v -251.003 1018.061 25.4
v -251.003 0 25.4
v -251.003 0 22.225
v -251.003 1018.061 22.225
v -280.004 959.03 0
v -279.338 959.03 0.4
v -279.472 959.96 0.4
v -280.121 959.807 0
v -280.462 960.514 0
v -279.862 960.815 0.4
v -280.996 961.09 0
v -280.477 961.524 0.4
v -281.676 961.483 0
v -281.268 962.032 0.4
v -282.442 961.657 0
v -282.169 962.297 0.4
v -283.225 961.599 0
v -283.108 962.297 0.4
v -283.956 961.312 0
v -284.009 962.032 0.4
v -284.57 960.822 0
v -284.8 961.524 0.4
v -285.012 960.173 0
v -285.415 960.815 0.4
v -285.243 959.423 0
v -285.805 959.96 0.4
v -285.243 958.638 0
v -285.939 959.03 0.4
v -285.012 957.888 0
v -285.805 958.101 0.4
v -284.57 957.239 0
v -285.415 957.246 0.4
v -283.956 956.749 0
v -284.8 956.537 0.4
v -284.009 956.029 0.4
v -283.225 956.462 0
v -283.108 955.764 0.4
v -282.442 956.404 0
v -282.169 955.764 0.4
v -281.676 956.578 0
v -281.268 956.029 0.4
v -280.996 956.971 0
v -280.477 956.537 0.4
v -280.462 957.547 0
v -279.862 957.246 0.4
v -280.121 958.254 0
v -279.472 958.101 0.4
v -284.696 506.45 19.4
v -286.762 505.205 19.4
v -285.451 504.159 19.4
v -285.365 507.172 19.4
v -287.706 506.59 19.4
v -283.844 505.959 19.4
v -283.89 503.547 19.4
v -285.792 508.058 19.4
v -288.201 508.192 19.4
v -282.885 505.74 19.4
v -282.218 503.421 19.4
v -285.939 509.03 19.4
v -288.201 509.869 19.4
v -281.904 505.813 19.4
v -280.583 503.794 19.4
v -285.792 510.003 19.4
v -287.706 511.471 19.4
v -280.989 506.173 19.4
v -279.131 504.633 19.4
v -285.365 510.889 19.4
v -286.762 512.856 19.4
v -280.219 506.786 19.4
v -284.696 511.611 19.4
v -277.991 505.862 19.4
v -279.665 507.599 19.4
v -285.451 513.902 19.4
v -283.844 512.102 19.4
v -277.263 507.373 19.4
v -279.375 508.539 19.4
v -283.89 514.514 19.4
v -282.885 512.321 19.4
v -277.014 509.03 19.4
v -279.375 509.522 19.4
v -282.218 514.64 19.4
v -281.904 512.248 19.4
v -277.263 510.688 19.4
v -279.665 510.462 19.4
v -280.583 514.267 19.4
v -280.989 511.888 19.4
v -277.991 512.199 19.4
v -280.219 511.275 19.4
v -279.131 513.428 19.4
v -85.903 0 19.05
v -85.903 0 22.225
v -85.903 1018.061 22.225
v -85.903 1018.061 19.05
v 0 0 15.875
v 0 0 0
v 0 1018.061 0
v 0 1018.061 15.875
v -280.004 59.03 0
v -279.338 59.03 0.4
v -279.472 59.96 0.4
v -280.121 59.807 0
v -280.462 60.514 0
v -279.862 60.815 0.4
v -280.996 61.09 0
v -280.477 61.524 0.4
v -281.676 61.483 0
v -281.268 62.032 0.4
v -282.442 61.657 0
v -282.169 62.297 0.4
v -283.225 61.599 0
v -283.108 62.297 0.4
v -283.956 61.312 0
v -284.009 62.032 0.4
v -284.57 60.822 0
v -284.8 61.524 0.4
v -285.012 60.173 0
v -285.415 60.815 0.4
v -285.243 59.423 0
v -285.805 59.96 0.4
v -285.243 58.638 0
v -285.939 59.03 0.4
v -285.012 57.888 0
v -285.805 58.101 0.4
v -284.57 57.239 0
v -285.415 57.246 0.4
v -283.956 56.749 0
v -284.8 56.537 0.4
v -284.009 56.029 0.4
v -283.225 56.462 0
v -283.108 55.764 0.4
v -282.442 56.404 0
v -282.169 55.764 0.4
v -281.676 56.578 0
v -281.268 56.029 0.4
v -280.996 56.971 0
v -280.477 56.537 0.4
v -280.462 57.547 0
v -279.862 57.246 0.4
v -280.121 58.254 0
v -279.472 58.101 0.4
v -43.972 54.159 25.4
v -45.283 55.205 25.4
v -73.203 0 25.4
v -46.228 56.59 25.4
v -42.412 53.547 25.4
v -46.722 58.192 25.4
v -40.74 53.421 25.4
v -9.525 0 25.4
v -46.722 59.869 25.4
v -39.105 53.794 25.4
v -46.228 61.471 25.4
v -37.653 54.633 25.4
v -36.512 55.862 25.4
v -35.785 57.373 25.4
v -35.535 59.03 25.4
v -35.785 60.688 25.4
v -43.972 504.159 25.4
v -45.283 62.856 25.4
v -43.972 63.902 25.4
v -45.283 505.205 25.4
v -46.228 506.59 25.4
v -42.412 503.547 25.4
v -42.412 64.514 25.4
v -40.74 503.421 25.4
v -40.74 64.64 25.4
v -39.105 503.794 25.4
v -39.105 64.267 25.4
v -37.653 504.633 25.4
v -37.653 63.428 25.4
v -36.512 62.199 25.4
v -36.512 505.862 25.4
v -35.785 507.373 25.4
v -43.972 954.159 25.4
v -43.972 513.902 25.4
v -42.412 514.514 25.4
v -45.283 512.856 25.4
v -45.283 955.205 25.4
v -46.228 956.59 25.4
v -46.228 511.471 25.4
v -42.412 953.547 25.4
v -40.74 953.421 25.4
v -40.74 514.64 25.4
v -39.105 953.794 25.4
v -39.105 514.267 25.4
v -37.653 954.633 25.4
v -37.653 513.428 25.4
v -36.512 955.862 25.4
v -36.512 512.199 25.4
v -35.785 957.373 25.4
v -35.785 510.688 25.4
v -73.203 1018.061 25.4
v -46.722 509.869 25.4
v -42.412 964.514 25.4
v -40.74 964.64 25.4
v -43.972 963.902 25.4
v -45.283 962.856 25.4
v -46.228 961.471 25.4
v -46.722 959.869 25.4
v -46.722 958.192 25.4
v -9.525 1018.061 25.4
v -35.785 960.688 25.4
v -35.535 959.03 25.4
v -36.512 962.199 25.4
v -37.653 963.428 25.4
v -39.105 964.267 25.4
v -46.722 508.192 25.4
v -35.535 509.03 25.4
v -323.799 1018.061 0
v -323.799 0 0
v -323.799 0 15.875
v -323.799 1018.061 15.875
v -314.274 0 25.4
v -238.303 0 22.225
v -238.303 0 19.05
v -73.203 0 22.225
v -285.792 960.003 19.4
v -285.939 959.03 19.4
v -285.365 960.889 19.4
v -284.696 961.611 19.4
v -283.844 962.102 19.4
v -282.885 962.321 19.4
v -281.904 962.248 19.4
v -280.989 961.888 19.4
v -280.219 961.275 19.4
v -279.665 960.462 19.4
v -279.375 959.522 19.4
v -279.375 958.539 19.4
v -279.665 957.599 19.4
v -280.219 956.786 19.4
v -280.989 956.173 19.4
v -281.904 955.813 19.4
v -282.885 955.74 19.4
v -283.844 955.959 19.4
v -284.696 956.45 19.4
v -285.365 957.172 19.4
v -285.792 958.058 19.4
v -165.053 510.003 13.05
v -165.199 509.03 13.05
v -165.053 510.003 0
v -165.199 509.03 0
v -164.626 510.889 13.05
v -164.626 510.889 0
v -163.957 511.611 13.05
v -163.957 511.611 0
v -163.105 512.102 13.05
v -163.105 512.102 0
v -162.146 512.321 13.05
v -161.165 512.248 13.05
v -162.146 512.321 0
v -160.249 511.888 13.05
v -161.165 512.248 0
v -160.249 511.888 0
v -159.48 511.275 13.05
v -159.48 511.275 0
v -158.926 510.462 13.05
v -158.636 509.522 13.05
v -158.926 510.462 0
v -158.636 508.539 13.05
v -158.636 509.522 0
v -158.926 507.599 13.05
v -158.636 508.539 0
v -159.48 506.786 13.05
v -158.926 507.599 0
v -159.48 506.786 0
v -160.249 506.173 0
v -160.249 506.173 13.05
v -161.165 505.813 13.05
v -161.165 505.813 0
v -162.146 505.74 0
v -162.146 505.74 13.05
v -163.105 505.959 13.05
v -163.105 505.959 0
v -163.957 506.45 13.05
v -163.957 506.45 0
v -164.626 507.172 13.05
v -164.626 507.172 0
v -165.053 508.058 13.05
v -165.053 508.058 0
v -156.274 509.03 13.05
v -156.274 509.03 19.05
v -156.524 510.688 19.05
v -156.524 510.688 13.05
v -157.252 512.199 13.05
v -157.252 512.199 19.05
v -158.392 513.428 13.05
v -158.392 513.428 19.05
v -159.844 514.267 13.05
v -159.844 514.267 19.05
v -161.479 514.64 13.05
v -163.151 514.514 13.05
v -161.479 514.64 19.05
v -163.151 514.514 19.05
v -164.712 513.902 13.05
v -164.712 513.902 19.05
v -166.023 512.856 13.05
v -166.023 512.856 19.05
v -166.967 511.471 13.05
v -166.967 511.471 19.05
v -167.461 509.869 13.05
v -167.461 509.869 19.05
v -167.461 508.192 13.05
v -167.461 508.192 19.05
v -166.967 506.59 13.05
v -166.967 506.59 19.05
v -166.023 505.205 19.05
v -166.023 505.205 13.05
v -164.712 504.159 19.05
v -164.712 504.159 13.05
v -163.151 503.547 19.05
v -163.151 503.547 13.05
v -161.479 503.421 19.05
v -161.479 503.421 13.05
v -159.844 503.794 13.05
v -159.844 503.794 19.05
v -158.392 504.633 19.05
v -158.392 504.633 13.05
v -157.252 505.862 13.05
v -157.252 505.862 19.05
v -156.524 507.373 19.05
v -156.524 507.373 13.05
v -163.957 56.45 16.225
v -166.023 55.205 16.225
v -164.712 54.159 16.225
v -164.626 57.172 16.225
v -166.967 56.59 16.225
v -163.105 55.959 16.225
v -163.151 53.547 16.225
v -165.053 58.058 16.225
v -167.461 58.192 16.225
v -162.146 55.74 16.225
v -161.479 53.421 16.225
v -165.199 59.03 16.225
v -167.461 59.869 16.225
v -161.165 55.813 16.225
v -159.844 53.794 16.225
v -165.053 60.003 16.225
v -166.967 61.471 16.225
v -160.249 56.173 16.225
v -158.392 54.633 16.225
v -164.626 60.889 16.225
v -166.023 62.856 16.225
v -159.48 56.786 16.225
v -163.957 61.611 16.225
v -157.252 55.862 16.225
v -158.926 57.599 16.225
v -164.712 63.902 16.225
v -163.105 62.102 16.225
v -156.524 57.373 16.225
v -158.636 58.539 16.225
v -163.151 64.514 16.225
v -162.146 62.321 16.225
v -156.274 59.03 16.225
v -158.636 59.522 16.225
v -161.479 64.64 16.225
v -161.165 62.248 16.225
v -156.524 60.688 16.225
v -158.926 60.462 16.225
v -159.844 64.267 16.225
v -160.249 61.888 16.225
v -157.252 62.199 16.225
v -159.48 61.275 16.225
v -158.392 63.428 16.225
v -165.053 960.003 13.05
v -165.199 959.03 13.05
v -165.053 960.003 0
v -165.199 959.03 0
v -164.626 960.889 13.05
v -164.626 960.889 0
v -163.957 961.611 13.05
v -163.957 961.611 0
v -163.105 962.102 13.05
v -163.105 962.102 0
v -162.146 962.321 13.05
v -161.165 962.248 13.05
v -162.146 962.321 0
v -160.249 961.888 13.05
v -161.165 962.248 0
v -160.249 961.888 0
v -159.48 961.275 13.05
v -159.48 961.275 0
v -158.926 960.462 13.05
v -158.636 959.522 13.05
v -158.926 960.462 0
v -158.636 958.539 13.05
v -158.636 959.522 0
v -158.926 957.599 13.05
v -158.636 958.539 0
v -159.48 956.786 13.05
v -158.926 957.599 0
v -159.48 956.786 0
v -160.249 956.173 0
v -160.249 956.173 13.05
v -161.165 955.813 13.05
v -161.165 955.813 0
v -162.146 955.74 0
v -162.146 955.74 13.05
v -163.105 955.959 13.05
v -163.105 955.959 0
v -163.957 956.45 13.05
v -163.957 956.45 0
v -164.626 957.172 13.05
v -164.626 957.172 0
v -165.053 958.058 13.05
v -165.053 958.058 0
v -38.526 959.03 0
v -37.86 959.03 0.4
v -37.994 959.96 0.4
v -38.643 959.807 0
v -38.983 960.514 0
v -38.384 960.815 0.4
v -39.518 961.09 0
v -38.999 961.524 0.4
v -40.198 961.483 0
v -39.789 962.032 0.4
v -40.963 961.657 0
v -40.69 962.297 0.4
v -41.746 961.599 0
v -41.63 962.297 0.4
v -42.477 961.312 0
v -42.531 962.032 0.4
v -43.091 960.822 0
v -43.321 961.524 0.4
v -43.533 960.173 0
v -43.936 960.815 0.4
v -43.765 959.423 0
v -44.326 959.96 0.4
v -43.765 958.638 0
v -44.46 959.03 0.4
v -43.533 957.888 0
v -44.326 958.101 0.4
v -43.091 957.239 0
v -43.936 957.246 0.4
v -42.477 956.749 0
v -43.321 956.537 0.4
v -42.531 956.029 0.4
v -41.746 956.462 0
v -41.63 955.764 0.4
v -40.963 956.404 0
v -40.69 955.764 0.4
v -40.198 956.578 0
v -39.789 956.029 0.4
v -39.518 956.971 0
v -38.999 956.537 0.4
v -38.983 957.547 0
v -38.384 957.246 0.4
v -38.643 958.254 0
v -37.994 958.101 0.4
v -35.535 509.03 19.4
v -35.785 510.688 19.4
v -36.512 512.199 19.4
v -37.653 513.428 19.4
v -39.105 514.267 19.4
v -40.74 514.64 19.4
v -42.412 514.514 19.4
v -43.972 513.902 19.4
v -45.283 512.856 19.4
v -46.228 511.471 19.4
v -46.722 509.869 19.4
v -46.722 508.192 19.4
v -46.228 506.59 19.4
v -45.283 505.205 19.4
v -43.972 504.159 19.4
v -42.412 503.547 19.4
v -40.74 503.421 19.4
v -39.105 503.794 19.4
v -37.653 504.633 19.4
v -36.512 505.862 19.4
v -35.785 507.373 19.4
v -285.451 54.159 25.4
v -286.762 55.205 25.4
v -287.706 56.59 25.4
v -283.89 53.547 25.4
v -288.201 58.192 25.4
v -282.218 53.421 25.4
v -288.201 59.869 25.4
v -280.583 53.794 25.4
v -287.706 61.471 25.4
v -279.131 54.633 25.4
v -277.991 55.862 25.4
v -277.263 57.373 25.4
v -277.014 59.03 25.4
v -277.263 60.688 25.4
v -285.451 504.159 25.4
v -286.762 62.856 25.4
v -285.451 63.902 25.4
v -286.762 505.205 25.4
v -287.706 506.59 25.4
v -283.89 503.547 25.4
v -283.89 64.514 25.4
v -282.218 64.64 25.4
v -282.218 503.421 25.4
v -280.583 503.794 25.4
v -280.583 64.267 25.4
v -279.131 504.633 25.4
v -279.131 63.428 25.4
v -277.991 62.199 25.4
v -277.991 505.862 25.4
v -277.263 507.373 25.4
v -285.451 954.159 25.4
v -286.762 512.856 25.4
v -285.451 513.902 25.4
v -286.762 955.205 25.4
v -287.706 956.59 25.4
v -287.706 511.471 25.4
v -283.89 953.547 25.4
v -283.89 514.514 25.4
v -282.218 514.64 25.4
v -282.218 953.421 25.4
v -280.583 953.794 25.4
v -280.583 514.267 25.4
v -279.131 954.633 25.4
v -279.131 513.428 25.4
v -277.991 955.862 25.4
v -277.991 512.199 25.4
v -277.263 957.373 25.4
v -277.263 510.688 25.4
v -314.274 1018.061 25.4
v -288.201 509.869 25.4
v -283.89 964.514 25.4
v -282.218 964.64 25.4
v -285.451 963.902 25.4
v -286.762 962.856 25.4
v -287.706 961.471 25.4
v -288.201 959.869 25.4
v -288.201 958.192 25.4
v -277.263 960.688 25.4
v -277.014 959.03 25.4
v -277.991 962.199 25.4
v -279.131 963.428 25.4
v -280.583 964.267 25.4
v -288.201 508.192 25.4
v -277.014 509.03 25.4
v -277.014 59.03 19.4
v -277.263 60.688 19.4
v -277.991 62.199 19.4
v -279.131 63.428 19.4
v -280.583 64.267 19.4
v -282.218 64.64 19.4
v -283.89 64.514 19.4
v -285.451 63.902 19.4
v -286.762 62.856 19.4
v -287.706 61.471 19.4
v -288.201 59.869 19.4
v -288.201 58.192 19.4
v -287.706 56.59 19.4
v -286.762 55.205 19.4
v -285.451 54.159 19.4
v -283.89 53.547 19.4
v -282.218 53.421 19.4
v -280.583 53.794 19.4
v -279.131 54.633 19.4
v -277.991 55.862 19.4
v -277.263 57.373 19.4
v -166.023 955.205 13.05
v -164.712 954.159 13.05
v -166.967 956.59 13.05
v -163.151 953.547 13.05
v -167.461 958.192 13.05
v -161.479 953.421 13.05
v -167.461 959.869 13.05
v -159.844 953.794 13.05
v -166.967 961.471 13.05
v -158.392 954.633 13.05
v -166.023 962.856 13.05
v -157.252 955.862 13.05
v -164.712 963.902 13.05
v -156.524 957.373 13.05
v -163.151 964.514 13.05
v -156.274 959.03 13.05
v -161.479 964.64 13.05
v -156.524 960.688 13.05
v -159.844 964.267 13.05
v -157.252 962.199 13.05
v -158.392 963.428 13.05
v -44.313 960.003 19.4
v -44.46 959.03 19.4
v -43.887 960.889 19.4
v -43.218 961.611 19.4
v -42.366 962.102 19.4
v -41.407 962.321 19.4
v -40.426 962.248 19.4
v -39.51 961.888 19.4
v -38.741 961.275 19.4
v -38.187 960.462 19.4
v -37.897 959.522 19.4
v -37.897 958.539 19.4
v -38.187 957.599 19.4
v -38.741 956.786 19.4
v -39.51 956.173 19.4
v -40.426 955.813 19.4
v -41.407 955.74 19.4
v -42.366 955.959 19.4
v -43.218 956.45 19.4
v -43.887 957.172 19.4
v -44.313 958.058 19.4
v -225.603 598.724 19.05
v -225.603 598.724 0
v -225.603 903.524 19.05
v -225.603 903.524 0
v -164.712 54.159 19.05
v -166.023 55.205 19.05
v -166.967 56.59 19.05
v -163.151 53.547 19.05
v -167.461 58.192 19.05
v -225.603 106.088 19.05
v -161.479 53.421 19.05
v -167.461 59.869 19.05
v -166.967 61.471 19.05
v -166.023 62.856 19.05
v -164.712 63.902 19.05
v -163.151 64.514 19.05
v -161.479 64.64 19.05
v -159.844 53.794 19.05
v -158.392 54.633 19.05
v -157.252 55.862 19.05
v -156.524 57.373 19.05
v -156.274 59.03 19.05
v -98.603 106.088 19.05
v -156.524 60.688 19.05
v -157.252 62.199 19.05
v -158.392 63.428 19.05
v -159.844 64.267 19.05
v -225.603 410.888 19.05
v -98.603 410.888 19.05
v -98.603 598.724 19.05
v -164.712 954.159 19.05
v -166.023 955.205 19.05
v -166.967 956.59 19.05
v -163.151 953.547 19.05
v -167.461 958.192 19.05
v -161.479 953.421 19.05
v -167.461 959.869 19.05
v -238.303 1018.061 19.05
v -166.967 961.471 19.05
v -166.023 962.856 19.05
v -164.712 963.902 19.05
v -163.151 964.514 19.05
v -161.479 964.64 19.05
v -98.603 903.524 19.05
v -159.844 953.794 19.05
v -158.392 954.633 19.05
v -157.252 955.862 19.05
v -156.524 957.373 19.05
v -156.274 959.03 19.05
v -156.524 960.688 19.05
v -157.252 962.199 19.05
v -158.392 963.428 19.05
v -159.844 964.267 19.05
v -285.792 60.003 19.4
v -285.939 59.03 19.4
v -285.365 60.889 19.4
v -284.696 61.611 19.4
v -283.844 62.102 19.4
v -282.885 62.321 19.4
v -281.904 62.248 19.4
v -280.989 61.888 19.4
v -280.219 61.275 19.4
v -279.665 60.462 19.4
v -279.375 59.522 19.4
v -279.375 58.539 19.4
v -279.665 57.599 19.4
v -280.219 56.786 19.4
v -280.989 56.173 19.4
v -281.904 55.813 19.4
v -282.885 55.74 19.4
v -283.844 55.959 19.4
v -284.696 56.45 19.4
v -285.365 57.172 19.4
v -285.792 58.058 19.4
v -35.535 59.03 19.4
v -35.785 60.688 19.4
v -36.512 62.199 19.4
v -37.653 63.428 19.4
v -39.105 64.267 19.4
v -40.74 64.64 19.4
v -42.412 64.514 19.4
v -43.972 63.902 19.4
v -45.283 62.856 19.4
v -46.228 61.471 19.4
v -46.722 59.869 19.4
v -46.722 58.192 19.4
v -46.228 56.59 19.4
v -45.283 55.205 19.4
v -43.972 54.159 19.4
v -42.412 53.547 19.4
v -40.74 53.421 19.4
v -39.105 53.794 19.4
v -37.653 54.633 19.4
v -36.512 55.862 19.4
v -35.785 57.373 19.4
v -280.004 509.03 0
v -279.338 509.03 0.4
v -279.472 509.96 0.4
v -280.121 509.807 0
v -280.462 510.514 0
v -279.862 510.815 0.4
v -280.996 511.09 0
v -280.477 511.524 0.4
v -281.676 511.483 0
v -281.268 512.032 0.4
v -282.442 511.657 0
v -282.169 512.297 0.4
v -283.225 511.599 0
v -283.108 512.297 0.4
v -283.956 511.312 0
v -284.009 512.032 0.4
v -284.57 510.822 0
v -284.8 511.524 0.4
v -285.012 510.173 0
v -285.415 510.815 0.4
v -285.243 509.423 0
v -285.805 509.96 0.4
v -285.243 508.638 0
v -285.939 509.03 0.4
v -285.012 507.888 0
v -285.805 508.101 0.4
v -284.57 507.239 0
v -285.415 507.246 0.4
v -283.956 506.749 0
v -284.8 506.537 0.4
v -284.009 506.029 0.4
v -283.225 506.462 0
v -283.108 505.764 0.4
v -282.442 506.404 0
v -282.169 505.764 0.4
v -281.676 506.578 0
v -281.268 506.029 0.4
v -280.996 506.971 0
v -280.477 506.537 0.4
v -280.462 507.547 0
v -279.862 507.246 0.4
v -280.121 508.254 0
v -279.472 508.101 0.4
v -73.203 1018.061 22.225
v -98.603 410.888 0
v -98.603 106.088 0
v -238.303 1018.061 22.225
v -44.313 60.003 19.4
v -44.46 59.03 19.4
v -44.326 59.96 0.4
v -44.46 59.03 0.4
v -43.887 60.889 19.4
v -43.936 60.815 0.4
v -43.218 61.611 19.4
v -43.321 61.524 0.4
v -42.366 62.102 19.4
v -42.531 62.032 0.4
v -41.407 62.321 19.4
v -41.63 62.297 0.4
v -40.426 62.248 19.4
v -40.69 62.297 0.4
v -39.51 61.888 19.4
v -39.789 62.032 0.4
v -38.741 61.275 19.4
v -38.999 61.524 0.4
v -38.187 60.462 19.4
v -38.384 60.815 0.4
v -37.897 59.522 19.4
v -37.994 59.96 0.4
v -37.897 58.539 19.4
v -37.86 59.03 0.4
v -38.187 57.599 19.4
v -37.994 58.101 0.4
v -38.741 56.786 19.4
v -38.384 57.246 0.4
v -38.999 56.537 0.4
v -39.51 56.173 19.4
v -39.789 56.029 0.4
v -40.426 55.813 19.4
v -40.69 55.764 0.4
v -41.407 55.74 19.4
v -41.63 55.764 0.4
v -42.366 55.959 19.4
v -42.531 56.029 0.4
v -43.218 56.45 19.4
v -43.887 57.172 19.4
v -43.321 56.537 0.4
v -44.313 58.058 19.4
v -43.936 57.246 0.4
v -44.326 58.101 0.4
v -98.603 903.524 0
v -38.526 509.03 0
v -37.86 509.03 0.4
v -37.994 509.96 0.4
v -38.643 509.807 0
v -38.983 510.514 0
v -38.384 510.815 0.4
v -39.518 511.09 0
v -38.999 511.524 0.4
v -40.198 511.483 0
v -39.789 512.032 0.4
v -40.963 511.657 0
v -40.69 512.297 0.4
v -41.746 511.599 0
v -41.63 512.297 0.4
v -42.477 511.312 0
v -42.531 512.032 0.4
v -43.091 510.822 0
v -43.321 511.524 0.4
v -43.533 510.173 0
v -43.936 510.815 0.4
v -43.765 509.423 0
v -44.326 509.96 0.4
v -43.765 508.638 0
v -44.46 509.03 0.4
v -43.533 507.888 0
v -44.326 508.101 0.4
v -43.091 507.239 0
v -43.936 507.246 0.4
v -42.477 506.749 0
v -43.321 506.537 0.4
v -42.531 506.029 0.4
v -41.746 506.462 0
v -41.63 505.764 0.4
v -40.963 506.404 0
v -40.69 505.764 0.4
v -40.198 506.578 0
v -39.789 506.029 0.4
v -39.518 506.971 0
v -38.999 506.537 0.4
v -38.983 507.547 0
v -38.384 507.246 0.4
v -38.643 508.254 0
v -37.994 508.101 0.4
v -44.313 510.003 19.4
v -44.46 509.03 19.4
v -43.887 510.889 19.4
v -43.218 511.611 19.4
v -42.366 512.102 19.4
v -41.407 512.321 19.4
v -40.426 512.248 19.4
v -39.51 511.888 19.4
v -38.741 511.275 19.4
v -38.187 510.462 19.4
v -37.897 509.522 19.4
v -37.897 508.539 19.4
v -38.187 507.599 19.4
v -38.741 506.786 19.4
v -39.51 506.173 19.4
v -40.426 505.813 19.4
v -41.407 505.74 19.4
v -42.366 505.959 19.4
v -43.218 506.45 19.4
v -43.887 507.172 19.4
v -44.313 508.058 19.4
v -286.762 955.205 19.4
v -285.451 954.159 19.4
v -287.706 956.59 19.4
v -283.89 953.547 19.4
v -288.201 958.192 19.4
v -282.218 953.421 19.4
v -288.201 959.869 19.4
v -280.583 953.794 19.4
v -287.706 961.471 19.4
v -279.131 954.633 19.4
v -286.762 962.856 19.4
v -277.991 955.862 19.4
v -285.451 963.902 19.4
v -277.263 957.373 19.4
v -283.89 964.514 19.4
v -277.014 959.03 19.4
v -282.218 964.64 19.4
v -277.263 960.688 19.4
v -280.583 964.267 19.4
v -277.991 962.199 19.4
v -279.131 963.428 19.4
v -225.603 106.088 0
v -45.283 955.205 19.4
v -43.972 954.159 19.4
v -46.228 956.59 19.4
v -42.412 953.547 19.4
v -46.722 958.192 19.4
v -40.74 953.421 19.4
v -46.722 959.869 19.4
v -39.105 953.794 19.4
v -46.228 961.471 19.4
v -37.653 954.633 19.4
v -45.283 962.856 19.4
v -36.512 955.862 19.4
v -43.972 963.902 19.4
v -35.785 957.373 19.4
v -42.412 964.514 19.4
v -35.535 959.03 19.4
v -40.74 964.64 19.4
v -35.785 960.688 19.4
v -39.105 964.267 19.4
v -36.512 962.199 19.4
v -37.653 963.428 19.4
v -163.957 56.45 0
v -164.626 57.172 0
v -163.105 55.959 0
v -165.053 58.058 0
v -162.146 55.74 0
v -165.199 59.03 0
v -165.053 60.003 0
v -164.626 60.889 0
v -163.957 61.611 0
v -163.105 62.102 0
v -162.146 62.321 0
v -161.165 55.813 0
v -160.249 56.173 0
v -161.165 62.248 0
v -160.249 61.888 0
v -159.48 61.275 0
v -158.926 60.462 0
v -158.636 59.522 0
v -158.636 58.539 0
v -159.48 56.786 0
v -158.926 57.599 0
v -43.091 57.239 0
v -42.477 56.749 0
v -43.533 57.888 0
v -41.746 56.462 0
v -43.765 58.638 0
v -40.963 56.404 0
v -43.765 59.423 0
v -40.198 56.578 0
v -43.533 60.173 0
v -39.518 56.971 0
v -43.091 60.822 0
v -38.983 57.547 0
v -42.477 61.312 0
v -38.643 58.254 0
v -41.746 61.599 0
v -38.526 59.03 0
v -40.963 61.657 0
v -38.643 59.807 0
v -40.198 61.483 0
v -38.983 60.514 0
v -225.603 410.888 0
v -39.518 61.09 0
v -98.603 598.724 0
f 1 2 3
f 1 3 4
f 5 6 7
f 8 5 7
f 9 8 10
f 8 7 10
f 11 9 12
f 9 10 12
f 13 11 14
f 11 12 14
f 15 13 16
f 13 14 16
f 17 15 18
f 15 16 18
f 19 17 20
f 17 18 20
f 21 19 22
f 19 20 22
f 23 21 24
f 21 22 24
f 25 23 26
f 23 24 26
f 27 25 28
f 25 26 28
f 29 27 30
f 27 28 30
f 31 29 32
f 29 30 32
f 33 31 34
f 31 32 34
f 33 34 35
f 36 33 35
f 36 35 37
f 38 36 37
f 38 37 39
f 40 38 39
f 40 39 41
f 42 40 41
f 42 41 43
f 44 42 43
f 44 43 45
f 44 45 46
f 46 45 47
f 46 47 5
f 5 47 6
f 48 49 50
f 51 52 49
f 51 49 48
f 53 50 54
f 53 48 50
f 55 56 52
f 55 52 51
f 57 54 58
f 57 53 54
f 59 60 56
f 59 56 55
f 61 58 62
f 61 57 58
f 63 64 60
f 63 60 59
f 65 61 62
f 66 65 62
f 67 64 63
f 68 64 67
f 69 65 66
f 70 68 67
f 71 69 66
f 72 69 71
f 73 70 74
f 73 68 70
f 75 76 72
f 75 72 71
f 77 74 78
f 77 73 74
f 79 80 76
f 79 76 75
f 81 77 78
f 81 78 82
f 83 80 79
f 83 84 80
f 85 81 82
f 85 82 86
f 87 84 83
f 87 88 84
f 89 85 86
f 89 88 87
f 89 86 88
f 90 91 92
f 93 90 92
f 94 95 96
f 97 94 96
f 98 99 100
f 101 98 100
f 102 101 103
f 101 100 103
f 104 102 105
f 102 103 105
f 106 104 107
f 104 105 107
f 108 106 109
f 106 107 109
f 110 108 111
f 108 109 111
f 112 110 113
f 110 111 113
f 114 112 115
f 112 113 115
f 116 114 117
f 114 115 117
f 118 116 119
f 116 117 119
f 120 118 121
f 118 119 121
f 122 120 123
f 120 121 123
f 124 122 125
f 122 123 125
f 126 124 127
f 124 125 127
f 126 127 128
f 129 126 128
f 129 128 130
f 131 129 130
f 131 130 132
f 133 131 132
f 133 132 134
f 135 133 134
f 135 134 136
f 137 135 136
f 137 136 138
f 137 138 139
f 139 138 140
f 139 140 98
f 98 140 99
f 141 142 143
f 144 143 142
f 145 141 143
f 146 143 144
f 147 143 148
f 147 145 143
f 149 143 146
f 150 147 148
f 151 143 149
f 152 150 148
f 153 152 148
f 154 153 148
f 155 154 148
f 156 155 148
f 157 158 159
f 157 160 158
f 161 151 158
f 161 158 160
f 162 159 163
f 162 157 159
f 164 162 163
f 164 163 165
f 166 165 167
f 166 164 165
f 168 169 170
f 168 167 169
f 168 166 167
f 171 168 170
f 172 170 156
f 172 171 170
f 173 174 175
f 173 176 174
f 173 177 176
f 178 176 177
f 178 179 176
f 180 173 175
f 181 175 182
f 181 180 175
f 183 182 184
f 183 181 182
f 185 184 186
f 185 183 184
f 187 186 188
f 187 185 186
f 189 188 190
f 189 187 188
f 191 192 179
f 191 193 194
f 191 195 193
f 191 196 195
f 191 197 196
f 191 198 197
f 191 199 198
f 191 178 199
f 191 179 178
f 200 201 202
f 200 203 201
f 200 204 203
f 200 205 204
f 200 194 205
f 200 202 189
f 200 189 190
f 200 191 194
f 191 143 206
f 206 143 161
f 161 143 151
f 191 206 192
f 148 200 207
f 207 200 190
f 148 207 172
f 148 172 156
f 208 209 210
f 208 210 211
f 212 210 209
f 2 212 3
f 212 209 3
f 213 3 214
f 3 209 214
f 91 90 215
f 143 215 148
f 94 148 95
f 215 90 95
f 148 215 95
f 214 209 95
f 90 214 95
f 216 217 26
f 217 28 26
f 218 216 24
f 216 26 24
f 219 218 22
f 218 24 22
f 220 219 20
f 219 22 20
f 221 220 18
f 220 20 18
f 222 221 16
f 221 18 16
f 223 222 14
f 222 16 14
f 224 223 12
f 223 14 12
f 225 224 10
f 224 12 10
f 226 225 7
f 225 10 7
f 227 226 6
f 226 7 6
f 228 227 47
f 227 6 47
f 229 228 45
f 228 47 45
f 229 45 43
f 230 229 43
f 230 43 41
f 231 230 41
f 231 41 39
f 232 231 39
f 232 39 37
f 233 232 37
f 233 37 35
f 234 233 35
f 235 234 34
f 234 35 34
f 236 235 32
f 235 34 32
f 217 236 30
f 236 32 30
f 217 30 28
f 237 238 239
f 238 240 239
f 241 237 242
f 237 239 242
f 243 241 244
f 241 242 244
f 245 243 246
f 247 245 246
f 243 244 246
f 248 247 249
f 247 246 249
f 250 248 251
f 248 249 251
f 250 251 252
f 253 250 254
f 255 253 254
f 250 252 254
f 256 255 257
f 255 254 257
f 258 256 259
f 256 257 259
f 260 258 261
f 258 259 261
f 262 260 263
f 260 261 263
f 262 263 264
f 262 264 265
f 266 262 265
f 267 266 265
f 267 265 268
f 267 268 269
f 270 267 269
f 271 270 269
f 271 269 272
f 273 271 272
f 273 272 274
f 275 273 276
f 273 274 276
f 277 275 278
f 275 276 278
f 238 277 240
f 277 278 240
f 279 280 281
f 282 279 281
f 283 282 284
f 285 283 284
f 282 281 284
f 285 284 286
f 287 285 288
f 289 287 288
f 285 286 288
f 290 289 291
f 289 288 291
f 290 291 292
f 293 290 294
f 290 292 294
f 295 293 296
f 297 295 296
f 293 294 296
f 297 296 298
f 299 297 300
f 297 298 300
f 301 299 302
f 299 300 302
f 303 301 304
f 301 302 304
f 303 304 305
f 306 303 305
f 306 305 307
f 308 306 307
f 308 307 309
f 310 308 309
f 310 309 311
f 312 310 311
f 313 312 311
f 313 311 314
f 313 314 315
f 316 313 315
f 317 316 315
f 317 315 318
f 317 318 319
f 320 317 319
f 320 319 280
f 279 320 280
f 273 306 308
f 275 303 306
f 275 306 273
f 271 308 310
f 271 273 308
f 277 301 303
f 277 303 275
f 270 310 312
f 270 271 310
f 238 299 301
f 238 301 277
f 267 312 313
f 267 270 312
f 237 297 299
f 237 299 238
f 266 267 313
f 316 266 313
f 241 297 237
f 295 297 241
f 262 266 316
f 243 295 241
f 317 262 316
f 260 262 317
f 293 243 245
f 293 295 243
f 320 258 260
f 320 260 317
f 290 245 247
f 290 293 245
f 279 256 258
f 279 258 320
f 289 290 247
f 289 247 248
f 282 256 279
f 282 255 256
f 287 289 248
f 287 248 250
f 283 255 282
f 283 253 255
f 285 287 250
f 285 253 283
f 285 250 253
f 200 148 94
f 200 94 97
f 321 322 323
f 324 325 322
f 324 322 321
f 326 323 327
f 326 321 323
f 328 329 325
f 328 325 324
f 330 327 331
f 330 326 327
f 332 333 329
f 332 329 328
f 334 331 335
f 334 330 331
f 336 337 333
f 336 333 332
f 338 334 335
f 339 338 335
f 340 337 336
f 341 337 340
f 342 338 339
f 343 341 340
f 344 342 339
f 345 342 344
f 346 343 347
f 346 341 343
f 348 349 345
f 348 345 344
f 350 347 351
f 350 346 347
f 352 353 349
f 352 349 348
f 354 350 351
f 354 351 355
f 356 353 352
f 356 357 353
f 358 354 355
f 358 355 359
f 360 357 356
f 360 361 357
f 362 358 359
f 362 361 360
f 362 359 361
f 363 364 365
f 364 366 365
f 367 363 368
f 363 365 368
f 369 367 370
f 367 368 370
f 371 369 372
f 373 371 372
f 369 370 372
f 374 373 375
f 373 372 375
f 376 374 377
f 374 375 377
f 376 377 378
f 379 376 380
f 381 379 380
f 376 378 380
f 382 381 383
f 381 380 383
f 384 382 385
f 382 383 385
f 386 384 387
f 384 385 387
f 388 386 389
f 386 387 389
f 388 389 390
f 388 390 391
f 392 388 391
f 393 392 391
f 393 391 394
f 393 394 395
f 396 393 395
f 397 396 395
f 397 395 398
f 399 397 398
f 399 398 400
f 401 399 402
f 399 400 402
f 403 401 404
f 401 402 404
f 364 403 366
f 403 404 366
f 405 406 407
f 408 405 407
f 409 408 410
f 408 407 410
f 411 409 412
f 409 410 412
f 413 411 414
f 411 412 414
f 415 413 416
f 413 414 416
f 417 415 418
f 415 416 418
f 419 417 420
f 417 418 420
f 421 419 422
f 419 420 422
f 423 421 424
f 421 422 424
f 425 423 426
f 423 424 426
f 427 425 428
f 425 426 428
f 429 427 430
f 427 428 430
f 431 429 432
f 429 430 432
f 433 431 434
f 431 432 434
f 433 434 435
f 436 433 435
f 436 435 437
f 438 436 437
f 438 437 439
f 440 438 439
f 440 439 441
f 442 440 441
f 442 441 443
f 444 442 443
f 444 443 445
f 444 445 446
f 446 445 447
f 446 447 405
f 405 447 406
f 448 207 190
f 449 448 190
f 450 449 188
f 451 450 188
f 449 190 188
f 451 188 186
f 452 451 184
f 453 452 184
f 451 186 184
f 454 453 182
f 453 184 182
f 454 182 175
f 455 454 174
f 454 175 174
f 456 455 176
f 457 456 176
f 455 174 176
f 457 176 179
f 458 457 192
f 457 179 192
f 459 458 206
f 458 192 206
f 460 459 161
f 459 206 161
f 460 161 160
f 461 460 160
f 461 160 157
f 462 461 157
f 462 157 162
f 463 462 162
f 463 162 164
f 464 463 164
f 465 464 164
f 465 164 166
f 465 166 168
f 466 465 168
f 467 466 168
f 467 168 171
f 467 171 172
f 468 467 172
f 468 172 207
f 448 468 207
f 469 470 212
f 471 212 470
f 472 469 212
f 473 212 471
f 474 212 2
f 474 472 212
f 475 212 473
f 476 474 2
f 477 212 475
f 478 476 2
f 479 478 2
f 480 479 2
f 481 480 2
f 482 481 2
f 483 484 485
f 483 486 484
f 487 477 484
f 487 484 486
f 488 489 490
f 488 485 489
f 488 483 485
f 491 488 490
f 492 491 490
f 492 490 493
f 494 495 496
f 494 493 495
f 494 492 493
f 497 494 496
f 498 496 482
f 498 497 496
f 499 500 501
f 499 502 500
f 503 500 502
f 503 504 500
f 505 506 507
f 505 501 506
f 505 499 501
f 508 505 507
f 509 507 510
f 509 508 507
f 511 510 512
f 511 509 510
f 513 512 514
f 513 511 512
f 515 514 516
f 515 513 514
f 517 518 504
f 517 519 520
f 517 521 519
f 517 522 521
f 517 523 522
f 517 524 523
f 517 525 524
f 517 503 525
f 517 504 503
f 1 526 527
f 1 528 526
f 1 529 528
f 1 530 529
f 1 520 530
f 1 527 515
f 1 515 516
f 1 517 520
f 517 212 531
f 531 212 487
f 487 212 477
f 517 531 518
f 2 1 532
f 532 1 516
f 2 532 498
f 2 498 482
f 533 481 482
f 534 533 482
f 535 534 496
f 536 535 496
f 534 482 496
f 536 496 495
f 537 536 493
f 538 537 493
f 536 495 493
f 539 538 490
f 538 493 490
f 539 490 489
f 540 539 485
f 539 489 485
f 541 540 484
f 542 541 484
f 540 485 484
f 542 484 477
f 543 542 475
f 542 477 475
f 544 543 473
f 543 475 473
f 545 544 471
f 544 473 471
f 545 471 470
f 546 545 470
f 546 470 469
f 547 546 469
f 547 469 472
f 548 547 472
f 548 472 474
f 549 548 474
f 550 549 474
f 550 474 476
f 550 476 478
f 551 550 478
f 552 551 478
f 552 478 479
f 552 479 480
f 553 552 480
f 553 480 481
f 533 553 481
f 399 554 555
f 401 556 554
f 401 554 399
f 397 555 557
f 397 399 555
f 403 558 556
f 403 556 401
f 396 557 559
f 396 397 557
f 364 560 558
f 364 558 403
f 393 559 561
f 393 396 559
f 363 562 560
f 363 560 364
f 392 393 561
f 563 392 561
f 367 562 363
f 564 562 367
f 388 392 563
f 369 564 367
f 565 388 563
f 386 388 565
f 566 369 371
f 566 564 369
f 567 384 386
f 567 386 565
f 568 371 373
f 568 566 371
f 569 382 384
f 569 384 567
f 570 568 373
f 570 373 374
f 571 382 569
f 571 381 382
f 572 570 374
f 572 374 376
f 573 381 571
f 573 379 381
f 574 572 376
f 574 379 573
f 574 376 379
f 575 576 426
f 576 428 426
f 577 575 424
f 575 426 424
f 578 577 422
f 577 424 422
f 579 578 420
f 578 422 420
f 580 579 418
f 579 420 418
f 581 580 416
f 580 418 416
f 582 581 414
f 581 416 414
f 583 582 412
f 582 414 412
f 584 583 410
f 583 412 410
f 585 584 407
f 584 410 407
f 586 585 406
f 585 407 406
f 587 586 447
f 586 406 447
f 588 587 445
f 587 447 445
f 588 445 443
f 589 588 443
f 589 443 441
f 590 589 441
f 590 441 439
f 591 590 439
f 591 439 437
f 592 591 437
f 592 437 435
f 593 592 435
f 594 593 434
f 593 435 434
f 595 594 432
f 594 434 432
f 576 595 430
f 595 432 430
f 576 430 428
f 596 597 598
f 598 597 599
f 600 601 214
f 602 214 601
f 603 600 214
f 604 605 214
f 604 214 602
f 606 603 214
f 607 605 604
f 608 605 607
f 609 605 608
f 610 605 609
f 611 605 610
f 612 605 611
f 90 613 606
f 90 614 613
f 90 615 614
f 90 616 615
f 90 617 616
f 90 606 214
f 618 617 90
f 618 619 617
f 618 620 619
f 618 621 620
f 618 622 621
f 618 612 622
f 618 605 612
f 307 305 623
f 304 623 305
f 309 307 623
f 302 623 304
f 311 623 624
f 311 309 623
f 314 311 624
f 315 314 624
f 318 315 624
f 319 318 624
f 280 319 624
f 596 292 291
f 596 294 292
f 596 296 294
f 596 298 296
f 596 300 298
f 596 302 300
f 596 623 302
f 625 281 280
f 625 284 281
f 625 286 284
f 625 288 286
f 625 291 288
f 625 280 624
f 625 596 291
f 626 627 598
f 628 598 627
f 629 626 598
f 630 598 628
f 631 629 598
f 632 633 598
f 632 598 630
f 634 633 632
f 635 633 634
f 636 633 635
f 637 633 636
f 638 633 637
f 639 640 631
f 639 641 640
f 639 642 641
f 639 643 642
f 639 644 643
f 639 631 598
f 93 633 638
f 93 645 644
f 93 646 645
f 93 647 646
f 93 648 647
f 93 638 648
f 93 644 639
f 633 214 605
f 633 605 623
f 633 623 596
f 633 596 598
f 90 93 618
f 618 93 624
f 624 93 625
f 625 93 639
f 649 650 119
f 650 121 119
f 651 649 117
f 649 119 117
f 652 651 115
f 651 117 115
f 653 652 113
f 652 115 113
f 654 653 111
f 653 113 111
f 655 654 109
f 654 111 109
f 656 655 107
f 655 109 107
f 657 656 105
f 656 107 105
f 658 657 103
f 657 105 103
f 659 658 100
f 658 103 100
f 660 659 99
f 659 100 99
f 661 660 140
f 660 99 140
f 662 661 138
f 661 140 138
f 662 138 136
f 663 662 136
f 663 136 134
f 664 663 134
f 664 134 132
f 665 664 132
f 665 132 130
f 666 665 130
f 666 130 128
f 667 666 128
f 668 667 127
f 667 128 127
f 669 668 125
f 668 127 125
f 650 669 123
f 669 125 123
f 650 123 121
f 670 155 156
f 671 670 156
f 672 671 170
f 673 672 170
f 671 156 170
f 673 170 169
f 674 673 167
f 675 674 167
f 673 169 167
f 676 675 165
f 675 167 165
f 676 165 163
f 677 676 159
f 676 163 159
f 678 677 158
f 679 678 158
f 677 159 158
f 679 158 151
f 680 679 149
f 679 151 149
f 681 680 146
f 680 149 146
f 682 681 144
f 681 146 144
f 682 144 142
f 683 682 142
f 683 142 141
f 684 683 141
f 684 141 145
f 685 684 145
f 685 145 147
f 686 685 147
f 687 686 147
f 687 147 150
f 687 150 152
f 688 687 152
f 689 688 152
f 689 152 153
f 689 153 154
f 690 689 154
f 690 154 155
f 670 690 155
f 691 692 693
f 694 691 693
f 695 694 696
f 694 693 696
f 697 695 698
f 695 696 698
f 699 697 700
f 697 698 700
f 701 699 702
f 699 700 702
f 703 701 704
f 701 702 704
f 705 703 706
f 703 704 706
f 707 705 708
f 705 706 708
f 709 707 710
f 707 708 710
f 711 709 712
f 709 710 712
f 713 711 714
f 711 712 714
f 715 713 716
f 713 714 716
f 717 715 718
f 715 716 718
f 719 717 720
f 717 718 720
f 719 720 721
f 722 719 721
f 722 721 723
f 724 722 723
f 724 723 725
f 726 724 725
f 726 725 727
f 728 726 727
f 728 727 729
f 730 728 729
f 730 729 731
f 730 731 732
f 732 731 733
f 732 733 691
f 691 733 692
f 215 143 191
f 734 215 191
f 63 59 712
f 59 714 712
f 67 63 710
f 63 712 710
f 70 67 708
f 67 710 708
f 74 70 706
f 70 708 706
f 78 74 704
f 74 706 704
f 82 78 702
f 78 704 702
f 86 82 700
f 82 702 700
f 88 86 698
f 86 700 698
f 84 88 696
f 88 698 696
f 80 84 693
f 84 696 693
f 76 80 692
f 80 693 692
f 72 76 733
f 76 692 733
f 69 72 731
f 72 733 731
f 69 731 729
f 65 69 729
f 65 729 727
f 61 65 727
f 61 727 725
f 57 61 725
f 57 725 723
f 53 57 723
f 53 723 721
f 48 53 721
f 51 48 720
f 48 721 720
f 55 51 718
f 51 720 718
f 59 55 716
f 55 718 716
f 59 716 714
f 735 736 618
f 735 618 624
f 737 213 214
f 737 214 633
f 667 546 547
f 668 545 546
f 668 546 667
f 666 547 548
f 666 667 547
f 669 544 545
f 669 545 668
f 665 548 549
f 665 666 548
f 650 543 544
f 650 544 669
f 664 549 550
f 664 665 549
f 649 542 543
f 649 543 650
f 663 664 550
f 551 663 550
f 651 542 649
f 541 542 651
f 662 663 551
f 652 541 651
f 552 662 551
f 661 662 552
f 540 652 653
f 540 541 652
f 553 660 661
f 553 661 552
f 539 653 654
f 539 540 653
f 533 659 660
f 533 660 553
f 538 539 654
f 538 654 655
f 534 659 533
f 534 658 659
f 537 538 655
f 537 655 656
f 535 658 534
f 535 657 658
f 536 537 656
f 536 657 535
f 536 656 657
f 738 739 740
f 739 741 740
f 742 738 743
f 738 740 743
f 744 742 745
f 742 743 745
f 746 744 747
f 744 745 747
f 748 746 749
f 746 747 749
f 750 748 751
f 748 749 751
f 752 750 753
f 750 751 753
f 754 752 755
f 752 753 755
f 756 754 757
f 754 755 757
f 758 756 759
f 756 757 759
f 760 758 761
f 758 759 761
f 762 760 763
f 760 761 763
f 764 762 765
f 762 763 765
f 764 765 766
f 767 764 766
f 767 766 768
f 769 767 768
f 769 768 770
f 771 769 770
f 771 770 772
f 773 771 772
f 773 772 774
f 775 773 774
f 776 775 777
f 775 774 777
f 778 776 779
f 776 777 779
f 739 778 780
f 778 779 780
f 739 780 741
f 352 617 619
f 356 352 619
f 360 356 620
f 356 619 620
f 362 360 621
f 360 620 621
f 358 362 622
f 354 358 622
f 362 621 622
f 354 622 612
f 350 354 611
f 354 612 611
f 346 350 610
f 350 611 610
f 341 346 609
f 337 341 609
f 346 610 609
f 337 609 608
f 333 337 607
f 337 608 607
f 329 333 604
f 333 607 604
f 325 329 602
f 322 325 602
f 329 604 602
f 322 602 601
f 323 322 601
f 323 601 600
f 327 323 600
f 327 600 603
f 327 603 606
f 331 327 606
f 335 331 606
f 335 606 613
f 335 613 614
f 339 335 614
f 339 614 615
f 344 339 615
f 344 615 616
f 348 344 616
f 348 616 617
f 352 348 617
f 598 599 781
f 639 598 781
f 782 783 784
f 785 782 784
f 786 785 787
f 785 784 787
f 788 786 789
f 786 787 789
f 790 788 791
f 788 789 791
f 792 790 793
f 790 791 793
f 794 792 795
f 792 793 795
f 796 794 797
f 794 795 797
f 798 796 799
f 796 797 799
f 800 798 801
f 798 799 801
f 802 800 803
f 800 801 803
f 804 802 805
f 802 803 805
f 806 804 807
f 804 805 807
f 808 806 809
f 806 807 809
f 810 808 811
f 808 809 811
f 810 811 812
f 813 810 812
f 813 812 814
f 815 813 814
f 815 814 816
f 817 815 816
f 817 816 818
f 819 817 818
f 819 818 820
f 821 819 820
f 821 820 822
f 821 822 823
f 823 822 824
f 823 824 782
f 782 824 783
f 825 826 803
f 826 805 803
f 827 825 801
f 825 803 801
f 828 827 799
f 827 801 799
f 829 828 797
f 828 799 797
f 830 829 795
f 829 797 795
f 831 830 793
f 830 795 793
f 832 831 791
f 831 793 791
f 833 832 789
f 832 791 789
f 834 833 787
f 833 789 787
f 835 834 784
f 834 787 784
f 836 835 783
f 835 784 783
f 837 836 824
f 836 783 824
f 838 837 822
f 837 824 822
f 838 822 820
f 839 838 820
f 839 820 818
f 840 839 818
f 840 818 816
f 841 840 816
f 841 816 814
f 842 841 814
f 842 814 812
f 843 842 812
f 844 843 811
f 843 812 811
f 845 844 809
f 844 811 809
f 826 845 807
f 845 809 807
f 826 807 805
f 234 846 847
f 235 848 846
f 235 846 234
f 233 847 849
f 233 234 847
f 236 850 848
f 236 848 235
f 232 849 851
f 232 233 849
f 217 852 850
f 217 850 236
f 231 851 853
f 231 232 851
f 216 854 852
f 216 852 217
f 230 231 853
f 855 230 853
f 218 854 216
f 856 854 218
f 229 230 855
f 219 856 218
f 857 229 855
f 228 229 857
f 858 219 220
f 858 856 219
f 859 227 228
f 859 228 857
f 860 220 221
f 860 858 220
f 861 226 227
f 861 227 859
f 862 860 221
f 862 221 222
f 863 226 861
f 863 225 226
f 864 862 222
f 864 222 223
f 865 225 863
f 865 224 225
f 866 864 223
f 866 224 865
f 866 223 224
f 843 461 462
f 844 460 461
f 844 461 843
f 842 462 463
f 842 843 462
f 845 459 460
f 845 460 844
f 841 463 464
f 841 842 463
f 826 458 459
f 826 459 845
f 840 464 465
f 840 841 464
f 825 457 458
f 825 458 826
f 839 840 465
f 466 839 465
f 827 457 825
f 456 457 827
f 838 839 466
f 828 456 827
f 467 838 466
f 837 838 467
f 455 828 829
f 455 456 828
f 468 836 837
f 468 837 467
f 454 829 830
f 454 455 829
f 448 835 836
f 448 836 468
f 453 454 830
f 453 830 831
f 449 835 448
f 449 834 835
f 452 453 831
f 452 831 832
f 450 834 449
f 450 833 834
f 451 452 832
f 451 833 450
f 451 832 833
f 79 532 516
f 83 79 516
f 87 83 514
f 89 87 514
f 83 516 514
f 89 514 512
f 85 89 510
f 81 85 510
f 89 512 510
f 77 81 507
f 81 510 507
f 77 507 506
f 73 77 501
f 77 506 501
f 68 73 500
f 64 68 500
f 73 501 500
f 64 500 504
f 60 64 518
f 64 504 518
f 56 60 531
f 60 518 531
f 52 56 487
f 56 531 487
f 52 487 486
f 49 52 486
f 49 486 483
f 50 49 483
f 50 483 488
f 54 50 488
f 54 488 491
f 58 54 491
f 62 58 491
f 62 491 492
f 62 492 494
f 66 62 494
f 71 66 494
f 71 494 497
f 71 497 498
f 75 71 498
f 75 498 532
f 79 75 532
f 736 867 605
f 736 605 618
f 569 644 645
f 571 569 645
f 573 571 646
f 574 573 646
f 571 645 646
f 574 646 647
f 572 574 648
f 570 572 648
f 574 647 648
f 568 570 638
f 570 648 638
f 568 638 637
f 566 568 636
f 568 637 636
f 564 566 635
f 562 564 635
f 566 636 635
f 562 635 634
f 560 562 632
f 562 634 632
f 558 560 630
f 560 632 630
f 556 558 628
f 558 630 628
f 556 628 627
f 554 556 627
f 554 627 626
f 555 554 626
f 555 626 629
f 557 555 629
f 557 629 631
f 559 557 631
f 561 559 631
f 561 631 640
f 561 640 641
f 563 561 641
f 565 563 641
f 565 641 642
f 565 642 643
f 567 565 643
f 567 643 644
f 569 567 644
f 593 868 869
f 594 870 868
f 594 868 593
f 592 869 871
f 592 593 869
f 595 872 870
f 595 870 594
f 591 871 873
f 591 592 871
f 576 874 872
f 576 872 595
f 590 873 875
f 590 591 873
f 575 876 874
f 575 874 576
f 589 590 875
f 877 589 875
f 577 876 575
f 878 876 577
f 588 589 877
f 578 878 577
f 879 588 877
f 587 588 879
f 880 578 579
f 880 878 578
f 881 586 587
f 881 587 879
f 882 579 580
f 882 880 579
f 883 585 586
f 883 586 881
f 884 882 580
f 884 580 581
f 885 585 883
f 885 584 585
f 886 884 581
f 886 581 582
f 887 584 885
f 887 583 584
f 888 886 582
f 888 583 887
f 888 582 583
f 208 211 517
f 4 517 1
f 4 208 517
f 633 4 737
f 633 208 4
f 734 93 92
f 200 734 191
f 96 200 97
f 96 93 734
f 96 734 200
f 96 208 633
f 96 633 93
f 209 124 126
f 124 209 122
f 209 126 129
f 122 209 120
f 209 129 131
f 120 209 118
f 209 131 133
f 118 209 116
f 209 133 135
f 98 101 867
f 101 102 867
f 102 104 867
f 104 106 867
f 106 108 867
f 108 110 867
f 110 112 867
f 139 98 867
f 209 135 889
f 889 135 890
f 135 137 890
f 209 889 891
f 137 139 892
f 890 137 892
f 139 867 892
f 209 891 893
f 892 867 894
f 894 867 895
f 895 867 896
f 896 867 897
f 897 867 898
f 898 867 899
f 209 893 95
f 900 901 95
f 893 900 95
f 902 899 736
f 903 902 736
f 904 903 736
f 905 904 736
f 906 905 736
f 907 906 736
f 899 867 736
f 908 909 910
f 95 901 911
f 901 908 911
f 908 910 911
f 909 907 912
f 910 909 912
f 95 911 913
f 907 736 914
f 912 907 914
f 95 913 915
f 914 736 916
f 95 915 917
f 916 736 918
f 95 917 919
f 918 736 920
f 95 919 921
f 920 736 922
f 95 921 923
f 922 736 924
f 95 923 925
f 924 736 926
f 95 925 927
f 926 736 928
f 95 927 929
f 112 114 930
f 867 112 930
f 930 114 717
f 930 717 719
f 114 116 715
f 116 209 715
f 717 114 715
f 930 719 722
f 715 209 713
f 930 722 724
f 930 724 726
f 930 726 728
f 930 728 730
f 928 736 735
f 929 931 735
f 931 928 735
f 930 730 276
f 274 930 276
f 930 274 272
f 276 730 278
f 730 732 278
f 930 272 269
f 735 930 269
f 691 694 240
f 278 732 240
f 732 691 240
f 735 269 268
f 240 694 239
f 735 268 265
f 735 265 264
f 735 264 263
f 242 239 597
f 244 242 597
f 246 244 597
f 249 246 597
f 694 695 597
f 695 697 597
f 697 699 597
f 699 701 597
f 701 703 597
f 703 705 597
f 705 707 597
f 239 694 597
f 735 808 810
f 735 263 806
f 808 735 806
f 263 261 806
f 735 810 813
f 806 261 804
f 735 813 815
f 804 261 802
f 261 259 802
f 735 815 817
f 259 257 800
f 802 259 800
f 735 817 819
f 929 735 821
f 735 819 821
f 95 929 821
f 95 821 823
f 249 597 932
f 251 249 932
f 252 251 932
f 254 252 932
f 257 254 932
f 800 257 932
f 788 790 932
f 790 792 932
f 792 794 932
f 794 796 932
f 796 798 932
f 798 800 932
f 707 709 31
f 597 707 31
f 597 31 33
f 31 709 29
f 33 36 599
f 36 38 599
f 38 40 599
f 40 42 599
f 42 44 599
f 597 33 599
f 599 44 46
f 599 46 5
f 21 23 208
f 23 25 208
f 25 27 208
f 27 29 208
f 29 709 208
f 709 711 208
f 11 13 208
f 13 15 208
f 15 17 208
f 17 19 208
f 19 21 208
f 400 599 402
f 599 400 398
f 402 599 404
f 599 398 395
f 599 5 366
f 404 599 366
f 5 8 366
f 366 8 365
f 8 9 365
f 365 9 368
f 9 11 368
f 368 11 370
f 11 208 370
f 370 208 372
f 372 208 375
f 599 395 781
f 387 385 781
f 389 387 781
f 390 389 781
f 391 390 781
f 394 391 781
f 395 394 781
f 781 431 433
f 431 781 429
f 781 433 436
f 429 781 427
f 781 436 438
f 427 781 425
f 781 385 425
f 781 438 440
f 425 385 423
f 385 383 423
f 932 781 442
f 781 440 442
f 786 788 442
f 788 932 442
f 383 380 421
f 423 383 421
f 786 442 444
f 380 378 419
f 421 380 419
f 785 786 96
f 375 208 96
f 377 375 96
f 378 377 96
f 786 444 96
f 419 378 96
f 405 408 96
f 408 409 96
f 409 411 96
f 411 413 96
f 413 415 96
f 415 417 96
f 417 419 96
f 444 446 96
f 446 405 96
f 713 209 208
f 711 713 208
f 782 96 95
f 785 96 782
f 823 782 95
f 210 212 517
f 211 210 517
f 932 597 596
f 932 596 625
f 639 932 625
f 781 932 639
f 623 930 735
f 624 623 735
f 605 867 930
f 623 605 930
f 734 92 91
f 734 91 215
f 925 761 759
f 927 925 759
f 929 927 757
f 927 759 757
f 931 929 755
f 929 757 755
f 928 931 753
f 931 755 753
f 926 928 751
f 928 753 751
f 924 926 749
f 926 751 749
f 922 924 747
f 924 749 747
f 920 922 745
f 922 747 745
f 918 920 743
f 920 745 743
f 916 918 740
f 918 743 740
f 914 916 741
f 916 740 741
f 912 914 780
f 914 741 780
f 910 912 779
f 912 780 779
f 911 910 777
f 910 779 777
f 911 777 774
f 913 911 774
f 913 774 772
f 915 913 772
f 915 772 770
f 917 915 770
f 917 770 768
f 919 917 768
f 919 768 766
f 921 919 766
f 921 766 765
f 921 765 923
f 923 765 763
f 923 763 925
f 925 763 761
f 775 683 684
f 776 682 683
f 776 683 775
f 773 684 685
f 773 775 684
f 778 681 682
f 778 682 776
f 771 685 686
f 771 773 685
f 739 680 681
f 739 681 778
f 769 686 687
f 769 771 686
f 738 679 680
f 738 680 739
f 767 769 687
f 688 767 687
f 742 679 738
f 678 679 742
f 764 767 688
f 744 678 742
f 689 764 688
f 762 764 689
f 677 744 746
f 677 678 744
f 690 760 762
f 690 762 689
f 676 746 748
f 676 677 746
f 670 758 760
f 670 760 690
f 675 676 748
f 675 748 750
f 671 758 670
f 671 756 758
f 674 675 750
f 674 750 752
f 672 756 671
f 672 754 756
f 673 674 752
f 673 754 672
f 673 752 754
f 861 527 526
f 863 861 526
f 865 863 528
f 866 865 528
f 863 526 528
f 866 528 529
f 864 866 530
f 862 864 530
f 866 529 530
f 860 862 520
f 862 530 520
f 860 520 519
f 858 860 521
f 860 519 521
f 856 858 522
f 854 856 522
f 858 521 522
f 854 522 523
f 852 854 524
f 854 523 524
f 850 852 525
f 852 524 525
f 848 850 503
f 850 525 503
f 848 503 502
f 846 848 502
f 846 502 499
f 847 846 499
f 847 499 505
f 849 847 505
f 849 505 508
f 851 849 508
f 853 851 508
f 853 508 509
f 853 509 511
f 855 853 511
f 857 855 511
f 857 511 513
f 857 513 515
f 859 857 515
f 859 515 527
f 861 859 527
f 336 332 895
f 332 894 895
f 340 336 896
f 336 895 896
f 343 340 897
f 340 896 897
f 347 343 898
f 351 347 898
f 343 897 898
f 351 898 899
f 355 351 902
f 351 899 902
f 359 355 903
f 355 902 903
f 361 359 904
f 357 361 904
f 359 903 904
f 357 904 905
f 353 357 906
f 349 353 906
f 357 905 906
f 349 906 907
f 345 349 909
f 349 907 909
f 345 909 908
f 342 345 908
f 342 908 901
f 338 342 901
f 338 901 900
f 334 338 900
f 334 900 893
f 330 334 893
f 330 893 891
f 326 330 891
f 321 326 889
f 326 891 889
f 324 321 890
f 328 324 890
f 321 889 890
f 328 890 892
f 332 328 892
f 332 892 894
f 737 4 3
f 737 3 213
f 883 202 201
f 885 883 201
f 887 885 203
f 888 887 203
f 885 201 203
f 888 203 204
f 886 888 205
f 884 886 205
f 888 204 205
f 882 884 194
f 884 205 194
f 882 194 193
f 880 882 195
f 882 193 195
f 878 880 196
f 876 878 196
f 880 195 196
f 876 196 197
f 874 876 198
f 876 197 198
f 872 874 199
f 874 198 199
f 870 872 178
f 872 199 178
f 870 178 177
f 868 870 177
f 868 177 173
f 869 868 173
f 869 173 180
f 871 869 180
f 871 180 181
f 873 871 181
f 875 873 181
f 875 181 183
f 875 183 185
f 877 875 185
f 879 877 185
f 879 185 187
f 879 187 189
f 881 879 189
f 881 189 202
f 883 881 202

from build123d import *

# Parameters (mm, degrees)
F0_W                   = 323.799
F0_H                   = 1018.061
F0_W_2                 = 127
F0_H_2                 = 304.8
F1_DEPTH               = 25.4
F2_W                   = 177.8
F2_H                   = 1077.8446237831
F3_DEPTH               = 3.175
F4_W                   = 152.4
F4_H                   = 1094.5154423737
F5_DEPTH               = 3.175
F6_SIZE                = 9.525
F8_D                   = 6.6
F8_DEPTH               = 25
F8_CBORE_D             = 11.25
F8_CBORE_DEPTH         = 6
F8_TIP                 = 1.9828400428
F10_D                  = 6.6
F10_DEPTH              = 25
F10_CBORE_D            = 11.25
F10_CBORE_DEPTH        = 6
F10_TIP                = 1.9828400428
F13_D                  = 6.6
F13_CBORE_D            = 11.25
F13_CBORE_DEPTH        = 6
F13_ON_F12_D           = 6.6
F13_ON_F12_CBORE_D     = 11.25
F13_ON_F12_CBORE_DEPTH = 6


# Not quite as in the source:
# - a feature names something its author has since deleted; it is built from what else it names


with BuildPart() as f1:
    # F0 (on Top) → F1 (new body)
    with BuildSketch(Plane.XY):
        with Locations((-161.8995, 509.0305)):
            Rectangle(F0_W, F0_H)
        with Locations((-162.103, 258.488)):
            Rectangle(F0_W_2, F0_H_2, mode=Mode.SUBTRACT)
        with Locations((-162.103, 751.124)):
            Rectangle(F0_W_2, F0_H_2, mode=Mode.SUBTRACT)
    extrude(amount=F1_DEPTH)

    # F2 (on face) → F3 (cut)
    with BuildSketch(Plane.XY.offset(25.4)):
        with Locations((-162.103, 495.1518476009)):
            Rectangle(F2_W, F2_H)
    extrude(amount=-F3_DEPTH, mode=Mode.SUBTRACT)

    # F4 (on face) → F5 (cut)
    with BuildSketch(Plane.XY.offset(22.225)):
        with Locations((-162.103, 504.4111407595)):
            Rectangle(F4_W, F4_H)
    extrude(amount=-F5_DEPTH, mode=Mode.SUBTRACT)

    # F6
    f6_edges = [f1.edges().sort_by_distance(p)[0] for p in [
        (-323.799, 509.0305, 25.4),
        (0, 509.0305, 25.4),
    ]]
    chamfer(f6_edges, length=F6_SIZE)

    # F8
    with Locations(Plane.XY.offset(25.4)):
        with Locations((-41.16, 59.0305), (-41.16, 509.0305), (-41.16, 959.0305)):
            CounterBoreHole(F8_D / 2, F8_CBORE_D / 2, F8_CBORE_DEPTH, depth=F8_DEPTH)
            with Locations((0, 0, -(F8_DEPTH + F8_TIP / 2))):  # 118° drill point
                Cone(0, F8_D / 2, F8_TIP, mode=Mode.SUBTRACT)

    # F10
    with Locations(Plane.XY.offset(25.4)):
        with Locations((-282.6385, 59.0305), (-282.6385, 509.0305), (-282.6385, 959.0305)):
            CounterBoreHole(F10_D / 2, F10_CBORE_D / 2, F10_CBORE_DEPTH, depth=F10_DEPTH)
            with Locations((0, 0, -(F10_DEPTH + F10_TIP / 2))):  # 118° drill point
                Cone(0, F10_D / 2, F10_TIP, mode=Mode.SUBTRACT)

    # F13 (through all)
    with Locations(Plane.XY.offset(22.225)):
        with Locations((-161.89925, 59.0305)):
            CounterBoreHole(F13_D / 2, F13_CBORE_D / 2, F13_CBORE_DEPTH)

    # F13 on F12 (through all)
    with Locations(Plane.XY.offset(19.05)):
        with Locations((-161.89925, 509.0305), (-161.89925, 959.0305)):
            CounterBoreHole(F13_ON_F12_D / 2, F13_ON_F12_CBORE_D / 2, F13_ON_F12_CBORE_DEPTH)


solid = f1.part
